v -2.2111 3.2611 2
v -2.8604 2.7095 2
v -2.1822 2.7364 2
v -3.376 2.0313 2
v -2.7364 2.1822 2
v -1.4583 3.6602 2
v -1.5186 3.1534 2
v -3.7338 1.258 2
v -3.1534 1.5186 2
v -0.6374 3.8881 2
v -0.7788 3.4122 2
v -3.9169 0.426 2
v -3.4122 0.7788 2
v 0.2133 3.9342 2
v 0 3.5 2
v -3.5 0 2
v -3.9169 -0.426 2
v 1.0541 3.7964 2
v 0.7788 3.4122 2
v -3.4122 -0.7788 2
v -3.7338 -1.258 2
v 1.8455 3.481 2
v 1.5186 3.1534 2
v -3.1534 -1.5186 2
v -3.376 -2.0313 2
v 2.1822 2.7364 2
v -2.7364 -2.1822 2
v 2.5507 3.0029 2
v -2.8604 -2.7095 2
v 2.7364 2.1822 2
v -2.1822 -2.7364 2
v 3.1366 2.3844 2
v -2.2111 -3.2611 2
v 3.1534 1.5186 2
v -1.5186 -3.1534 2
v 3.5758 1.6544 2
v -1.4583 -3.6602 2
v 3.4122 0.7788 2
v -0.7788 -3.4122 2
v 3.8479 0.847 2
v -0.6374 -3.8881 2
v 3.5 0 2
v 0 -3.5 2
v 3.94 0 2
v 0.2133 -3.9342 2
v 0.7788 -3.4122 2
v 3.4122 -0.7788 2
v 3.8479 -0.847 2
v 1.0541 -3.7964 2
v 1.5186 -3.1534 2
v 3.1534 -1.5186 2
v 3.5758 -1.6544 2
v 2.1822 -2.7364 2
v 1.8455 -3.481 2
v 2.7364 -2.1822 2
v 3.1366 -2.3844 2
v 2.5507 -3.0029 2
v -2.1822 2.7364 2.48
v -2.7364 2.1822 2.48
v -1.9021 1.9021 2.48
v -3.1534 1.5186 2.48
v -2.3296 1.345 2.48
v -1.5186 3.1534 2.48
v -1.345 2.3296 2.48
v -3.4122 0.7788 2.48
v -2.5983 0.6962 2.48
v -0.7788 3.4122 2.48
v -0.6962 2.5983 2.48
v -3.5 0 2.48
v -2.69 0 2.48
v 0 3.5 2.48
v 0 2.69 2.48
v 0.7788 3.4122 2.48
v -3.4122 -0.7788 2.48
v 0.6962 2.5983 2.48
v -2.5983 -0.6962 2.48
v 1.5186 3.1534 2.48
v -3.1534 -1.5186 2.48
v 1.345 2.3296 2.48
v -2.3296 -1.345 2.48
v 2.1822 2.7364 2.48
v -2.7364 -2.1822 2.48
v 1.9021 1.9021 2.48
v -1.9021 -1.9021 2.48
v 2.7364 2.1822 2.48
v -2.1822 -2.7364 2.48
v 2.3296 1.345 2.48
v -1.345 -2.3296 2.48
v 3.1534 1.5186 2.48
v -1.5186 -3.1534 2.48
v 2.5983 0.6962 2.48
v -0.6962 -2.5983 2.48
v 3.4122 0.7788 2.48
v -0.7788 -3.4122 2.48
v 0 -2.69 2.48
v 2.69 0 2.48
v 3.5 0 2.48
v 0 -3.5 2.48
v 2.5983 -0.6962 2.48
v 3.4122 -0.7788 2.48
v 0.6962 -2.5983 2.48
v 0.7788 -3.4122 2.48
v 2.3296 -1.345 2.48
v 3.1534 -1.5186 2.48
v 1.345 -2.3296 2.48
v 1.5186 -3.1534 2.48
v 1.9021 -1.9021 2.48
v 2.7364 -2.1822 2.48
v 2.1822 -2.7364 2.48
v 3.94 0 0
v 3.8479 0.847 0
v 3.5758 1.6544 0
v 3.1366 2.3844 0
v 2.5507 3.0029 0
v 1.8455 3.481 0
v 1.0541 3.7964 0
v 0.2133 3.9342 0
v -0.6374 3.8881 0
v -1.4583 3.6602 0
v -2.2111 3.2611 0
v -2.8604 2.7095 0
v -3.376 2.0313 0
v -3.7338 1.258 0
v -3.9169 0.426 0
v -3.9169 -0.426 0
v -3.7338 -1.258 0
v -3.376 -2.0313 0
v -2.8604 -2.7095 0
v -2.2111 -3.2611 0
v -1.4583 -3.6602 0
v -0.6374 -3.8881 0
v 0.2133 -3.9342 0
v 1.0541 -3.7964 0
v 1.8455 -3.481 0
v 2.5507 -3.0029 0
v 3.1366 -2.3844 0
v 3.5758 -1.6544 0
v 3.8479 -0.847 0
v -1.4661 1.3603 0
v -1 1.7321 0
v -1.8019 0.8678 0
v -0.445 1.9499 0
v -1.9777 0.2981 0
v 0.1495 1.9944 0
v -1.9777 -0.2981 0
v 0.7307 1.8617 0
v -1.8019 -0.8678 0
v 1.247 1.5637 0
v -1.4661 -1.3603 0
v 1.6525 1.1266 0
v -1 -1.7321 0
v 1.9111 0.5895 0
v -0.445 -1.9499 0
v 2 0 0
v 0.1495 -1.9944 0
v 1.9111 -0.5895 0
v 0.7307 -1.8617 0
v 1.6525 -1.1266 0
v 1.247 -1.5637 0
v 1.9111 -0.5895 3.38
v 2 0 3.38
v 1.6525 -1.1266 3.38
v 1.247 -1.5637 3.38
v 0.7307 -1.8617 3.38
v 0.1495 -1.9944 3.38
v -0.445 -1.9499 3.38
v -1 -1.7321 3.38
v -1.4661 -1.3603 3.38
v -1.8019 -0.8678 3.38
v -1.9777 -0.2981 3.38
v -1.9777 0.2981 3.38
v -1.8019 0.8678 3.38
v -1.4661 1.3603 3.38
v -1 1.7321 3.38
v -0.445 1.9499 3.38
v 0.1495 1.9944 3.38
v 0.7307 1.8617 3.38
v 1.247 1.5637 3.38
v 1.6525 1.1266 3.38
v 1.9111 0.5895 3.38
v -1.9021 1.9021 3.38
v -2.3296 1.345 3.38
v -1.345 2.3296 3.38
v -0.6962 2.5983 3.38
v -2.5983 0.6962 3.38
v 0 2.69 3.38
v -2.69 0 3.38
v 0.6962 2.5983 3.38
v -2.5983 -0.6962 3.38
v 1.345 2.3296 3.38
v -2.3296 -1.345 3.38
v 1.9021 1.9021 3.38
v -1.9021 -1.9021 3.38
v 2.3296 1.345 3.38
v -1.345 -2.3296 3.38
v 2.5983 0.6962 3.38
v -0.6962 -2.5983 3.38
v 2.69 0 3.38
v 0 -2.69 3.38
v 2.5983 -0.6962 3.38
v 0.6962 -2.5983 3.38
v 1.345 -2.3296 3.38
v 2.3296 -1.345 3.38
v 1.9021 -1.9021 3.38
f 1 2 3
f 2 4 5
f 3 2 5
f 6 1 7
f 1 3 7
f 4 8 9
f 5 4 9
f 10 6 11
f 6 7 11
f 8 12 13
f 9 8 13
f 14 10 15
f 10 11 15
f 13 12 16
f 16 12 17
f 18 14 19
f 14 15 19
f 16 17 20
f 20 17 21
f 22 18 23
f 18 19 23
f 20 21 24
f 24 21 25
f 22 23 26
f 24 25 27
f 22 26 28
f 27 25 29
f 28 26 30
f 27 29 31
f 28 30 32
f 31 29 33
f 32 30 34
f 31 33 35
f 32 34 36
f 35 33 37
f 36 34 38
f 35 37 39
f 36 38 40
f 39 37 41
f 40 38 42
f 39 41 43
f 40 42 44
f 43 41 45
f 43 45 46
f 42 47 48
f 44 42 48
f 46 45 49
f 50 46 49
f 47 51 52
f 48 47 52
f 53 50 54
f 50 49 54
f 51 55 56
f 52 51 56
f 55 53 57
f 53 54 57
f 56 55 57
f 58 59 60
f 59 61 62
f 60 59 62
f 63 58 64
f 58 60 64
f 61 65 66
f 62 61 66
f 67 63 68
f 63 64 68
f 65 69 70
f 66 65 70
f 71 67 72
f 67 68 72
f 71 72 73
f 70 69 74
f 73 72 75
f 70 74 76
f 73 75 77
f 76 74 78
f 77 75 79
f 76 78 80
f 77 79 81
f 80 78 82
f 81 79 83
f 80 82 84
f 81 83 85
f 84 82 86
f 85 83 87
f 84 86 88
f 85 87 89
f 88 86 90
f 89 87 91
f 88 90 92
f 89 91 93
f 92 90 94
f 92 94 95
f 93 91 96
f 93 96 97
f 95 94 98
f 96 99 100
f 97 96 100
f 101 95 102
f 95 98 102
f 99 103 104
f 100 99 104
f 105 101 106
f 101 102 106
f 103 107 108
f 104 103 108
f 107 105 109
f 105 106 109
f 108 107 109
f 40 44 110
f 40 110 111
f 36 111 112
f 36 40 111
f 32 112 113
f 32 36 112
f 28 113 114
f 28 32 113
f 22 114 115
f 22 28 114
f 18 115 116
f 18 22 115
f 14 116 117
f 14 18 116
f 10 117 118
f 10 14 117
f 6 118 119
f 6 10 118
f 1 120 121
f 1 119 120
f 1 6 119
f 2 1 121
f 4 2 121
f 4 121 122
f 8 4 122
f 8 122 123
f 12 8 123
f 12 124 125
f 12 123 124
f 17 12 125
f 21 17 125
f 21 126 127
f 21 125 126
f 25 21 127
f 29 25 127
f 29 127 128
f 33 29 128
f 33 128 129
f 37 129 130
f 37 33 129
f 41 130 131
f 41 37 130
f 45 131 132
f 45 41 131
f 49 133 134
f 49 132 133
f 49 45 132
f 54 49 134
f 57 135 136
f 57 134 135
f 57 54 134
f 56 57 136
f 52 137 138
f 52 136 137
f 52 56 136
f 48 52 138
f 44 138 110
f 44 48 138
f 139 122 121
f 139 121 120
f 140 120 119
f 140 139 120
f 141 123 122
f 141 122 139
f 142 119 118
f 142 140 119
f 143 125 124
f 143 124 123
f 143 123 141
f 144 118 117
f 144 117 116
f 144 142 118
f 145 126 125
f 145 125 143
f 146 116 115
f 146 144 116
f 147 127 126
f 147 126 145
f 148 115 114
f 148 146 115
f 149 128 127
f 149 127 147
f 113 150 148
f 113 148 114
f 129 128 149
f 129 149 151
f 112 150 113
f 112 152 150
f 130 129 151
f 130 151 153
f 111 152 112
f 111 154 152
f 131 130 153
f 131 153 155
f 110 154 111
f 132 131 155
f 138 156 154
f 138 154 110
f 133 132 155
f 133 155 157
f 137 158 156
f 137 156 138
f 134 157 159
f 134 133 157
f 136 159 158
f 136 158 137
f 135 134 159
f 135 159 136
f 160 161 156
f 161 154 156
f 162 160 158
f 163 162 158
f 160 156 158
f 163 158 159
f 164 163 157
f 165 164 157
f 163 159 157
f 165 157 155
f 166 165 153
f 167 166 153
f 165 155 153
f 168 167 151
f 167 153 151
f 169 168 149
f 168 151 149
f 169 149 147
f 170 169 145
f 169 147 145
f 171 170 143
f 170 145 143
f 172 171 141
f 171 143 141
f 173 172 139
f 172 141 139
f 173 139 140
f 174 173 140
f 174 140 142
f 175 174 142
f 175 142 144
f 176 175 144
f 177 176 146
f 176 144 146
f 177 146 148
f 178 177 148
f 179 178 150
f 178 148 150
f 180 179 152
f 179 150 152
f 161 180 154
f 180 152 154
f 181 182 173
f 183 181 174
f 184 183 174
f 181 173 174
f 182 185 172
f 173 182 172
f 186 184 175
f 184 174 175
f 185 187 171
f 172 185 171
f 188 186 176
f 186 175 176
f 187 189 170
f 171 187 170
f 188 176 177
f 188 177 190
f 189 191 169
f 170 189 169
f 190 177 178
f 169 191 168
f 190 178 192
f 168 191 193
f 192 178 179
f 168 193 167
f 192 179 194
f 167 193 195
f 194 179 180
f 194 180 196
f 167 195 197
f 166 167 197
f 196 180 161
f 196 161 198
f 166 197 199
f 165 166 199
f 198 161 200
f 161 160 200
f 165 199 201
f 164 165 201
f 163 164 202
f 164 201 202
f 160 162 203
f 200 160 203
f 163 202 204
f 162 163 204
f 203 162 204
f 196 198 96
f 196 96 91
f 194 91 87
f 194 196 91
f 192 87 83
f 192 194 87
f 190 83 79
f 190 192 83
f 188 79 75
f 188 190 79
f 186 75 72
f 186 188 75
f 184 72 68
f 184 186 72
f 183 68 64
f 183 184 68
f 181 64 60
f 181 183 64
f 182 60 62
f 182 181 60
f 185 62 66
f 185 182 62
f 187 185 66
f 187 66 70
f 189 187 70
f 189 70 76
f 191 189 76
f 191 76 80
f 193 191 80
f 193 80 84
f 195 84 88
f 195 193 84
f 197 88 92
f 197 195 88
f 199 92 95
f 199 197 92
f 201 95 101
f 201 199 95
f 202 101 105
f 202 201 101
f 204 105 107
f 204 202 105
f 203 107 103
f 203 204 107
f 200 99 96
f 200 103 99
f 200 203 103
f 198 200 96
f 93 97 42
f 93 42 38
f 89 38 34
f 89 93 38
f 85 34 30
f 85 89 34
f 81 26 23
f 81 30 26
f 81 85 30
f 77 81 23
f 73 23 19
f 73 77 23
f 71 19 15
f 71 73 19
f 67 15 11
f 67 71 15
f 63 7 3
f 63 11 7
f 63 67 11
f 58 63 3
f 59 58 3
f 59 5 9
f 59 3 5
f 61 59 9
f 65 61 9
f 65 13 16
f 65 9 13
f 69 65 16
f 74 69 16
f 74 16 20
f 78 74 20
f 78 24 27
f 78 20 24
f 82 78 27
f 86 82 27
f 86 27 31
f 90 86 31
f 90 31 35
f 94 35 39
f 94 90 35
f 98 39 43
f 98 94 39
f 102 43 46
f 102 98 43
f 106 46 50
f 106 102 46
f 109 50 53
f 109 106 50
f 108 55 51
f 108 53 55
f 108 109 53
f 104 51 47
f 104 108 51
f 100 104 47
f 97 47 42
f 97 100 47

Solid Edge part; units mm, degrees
sketch "Sketch1" plane through (0, 0, 0) normal (0, -1, 0) x (1, 0, 0)
  line L0 (2, 0) -> (3.94, 0)
  line L1 (3.94, 0) -> (3.94, 2)
  line L2 (3.94, 2) -> (3.5, 2)
  line L3 (3.5, 2) -> (3.5, 2.48)
  line L4 (3.5, 2.48) -> (2.69, 2.48)
  line L5 (2.69, 2.48) -> (2.69, 3.38)
  line L6 (2.69, 3.38) -> (2, 3.38)
  line L7 (2, 3.38) -> (2, 0)
  dimension "D1" = 2
  dimension "D2" = 2
  dimension "D3" = 0.9
  dimension "D4" = 1.38
  dimension "D5" = 3.94
  dimension "D6" = 2.69
  dimension "D7" = 3.5
revolve "RevolvedProtrusion1" add sketch "Sketch1" angle 360 about axis through (0, 0, 54) along (0, 0, -1)
